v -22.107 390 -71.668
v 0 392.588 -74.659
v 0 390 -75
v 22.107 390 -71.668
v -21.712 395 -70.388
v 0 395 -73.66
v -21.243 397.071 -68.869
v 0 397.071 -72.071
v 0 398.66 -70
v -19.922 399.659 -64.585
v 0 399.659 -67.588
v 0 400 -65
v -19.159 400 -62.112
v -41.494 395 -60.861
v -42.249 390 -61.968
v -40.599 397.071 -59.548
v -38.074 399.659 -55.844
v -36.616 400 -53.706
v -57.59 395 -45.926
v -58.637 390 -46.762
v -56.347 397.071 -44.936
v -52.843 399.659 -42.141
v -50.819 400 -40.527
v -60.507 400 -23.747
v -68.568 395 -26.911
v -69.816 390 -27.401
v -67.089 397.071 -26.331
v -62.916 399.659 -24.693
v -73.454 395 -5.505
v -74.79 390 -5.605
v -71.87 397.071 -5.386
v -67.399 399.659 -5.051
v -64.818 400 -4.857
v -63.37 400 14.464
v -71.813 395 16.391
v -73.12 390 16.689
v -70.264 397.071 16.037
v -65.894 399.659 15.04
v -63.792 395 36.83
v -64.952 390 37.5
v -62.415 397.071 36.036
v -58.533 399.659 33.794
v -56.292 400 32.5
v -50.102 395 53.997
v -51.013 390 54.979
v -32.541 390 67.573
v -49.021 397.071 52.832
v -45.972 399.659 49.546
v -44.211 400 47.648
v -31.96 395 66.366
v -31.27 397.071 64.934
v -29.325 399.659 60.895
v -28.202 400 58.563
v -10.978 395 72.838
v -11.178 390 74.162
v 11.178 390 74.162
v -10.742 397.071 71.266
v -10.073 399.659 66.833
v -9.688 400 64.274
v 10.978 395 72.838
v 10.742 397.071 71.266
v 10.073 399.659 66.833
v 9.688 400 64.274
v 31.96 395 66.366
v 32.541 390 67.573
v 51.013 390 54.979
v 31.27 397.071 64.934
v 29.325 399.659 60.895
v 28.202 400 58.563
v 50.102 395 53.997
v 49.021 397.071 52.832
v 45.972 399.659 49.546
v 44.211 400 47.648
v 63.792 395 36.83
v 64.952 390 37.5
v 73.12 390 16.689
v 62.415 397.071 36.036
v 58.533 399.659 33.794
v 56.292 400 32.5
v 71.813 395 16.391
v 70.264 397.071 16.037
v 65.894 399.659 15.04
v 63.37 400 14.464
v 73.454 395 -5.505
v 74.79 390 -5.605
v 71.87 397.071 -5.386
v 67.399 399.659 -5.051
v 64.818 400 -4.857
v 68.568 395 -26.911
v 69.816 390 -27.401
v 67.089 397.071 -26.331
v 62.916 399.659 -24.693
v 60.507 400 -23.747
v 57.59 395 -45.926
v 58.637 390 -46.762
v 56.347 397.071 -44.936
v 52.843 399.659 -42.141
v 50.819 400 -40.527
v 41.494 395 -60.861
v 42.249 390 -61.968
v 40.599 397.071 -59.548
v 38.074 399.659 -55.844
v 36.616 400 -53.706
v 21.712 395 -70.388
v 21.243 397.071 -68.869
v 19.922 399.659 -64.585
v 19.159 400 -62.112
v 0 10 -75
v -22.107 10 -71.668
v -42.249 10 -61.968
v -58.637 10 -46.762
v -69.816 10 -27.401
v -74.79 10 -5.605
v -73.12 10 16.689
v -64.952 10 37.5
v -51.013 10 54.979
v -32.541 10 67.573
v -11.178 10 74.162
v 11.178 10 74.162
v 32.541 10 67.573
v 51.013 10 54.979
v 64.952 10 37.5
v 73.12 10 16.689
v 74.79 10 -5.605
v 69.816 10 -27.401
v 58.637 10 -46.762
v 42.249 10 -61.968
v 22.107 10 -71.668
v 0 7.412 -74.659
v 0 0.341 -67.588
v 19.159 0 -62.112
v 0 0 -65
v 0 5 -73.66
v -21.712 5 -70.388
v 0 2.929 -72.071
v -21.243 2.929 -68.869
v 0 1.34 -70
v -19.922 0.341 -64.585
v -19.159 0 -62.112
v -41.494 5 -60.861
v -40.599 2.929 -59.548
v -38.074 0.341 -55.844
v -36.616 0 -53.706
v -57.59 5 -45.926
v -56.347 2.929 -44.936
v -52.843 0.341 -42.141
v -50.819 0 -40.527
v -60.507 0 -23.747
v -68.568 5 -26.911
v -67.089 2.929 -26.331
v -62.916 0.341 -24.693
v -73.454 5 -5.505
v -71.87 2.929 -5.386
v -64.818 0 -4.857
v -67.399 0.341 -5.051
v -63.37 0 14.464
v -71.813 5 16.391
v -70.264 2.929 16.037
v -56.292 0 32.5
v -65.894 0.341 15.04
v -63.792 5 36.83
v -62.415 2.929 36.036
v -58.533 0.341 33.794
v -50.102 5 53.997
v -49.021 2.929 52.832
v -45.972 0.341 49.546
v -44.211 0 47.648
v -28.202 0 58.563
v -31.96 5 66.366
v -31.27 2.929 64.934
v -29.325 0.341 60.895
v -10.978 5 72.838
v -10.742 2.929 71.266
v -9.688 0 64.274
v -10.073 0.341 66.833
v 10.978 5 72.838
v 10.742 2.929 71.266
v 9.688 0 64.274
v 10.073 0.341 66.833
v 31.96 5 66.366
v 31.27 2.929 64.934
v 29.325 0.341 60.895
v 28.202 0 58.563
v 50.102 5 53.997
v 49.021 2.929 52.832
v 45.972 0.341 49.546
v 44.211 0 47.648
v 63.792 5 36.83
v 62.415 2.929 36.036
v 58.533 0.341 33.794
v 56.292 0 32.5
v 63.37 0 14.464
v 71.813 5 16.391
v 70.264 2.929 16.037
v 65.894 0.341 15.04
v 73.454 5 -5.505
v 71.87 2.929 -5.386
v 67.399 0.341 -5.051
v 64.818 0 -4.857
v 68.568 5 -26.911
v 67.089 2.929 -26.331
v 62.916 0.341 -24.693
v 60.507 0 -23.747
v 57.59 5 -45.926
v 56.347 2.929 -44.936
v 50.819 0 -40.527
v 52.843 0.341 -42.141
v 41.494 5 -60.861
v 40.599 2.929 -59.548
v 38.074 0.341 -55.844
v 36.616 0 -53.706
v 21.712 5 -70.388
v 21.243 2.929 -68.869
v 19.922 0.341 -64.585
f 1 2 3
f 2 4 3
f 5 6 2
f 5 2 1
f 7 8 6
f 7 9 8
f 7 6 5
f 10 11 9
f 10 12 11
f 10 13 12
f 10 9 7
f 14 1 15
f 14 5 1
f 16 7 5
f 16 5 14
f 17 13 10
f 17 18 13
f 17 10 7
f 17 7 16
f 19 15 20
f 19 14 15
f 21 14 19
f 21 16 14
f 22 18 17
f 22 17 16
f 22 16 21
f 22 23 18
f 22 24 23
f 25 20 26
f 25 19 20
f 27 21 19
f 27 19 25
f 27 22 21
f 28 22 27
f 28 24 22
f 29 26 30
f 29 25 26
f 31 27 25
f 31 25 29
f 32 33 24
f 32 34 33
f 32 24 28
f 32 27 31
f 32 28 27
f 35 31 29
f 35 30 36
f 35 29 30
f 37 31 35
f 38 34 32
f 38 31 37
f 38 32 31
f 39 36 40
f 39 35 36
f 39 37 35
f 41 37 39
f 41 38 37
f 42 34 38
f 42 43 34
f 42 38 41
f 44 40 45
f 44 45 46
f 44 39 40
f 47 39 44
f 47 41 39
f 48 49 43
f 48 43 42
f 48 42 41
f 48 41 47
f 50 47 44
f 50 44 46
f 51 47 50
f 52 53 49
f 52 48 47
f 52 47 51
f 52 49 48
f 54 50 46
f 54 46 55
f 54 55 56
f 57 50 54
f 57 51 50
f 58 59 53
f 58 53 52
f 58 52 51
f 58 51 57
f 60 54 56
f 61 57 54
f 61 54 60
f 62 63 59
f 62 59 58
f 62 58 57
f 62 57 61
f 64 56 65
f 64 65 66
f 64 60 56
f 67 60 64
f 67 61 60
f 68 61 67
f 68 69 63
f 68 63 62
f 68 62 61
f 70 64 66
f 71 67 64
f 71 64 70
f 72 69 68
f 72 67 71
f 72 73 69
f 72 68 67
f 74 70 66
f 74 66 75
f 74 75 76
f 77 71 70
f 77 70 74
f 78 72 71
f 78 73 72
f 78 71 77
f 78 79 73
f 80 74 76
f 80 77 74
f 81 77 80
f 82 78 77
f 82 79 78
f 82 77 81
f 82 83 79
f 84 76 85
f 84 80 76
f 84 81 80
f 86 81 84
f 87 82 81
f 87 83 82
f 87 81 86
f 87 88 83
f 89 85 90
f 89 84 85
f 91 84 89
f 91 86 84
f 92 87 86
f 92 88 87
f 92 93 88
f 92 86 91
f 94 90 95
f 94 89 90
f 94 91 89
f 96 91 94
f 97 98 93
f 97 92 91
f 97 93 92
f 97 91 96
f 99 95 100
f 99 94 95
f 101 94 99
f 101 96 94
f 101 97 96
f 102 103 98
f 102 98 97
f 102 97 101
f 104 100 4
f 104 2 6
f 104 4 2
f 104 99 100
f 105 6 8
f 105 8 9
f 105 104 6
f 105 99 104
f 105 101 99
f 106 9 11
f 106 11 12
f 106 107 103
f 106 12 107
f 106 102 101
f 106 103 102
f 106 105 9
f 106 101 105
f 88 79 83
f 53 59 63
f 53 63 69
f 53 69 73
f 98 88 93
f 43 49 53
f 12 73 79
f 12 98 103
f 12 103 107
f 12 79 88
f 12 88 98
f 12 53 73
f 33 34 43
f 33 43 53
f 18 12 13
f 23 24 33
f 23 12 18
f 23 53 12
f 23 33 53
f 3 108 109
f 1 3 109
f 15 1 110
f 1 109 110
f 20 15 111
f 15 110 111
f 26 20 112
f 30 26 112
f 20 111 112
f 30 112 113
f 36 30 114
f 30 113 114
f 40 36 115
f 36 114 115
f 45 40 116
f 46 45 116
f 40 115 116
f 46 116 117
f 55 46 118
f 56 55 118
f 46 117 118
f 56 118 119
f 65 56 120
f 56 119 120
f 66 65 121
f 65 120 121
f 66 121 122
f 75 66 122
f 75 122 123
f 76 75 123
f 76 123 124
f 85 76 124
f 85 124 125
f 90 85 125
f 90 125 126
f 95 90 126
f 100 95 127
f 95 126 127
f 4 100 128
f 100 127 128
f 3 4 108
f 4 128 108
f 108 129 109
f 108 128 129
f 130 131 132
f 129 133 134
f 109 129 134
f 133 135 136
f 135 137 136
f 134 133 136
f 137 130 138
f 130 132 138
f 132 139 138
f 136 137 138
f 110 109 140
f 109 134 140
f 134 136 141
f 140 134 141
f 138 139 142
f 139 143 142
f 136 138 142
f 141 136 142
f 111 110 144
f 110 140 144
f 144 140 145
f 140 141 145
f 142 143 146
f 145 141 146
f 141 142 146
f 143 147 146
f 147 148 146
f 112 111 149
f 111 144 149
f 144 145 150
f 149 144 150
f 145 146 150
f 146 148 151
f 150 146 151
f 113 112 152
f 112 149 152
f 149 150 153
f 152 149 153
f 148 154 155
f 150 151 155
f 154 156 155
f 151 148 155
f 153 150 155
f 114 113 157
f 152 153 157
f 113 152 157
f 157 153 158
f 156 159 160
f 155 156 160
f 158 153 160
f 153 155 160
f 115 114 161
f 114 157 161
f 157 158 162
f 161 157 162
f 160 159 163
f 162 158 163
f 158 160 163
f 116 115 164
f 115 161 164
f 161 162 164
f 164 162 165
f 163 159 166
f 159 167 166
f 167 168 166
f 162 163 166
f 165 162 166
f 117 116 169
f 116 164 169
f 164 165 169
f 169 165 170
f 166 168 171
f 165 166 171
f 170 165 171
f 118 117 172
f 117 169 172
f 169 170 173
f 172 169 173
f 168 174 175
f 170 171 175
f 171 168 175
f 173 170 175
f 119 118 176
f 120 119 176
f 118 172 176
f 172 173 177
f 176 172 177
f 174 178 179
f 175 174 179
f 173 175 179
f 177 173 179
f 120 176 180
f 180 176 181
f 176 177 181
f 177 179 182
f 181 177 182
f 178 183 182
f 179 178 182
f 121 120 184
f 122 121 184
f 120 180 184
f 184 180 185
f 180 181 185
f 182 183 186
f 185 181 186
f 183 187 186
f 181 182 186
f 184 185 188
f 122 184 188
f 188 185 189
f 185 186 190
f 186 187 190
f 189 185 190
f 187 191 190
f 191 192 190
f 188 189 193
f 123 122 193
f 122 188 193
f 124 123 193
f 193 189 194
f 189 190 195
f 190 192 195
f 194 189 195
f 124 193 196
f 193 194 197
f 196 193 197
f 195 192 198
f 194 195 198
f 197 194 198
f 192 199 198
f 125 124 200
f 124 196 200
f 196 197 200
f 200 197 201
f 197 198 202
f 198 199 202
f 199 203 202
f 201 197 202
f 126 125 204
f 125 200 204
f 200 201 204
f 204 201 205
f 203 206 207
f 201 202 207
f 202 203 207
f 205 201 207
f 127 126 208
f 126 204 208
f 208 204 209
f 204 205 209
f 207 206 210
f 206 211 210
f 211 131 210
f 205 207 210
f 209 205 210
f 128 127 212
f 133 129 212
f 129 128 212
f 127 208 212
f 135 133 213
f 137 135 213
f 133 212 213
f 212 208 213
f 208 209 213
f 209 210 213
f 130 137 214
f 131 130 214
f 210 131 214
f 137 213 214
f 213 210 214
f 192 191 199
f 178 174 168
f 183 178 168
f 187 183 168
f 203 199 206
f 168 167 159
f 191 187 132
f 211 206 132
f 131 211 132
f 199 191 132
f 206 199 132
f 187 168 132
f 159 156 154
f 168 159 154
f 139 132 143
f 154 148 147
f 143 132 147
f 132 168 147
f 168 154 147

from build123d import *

# Parameters (mm, degrees)
SKETCH1_R           = 75
BOSS_EXTRUDE1_DEPTH = 400
FILLET1_R           = 10
FILLET2_R           = 10


with BuildPart() as part:
    # Sketch1 → Boss-Extrude1 (new body)
    with BuildSketch(Plane(origin=(0, 0, 0), x_dir=(1, 0, 0), z_dir=(0, 1, 0))):
        with Locations(Location((0, 0, 0), (0, 0, 90))):
            Circle(SKETCH1_R)
    extrude(amount=BOSS_EXTRUDE1_DEPTH)

    # Fillet1
    fillet1_edges = [part.edges().sort_by_distance(p)[0] for p in [
        (0, 400, 75),
    ]]
    fillet(fillet1_edges, radius=FILLET1_R)

    # Fillet2
    fillet2_edges = [part.edges().sort_by_distance(p)[0] for p in [
        (0, 0, 75),
    ]]
    fillet(fillet2_edges, radius=FILLET2_R)


solid = part.part
